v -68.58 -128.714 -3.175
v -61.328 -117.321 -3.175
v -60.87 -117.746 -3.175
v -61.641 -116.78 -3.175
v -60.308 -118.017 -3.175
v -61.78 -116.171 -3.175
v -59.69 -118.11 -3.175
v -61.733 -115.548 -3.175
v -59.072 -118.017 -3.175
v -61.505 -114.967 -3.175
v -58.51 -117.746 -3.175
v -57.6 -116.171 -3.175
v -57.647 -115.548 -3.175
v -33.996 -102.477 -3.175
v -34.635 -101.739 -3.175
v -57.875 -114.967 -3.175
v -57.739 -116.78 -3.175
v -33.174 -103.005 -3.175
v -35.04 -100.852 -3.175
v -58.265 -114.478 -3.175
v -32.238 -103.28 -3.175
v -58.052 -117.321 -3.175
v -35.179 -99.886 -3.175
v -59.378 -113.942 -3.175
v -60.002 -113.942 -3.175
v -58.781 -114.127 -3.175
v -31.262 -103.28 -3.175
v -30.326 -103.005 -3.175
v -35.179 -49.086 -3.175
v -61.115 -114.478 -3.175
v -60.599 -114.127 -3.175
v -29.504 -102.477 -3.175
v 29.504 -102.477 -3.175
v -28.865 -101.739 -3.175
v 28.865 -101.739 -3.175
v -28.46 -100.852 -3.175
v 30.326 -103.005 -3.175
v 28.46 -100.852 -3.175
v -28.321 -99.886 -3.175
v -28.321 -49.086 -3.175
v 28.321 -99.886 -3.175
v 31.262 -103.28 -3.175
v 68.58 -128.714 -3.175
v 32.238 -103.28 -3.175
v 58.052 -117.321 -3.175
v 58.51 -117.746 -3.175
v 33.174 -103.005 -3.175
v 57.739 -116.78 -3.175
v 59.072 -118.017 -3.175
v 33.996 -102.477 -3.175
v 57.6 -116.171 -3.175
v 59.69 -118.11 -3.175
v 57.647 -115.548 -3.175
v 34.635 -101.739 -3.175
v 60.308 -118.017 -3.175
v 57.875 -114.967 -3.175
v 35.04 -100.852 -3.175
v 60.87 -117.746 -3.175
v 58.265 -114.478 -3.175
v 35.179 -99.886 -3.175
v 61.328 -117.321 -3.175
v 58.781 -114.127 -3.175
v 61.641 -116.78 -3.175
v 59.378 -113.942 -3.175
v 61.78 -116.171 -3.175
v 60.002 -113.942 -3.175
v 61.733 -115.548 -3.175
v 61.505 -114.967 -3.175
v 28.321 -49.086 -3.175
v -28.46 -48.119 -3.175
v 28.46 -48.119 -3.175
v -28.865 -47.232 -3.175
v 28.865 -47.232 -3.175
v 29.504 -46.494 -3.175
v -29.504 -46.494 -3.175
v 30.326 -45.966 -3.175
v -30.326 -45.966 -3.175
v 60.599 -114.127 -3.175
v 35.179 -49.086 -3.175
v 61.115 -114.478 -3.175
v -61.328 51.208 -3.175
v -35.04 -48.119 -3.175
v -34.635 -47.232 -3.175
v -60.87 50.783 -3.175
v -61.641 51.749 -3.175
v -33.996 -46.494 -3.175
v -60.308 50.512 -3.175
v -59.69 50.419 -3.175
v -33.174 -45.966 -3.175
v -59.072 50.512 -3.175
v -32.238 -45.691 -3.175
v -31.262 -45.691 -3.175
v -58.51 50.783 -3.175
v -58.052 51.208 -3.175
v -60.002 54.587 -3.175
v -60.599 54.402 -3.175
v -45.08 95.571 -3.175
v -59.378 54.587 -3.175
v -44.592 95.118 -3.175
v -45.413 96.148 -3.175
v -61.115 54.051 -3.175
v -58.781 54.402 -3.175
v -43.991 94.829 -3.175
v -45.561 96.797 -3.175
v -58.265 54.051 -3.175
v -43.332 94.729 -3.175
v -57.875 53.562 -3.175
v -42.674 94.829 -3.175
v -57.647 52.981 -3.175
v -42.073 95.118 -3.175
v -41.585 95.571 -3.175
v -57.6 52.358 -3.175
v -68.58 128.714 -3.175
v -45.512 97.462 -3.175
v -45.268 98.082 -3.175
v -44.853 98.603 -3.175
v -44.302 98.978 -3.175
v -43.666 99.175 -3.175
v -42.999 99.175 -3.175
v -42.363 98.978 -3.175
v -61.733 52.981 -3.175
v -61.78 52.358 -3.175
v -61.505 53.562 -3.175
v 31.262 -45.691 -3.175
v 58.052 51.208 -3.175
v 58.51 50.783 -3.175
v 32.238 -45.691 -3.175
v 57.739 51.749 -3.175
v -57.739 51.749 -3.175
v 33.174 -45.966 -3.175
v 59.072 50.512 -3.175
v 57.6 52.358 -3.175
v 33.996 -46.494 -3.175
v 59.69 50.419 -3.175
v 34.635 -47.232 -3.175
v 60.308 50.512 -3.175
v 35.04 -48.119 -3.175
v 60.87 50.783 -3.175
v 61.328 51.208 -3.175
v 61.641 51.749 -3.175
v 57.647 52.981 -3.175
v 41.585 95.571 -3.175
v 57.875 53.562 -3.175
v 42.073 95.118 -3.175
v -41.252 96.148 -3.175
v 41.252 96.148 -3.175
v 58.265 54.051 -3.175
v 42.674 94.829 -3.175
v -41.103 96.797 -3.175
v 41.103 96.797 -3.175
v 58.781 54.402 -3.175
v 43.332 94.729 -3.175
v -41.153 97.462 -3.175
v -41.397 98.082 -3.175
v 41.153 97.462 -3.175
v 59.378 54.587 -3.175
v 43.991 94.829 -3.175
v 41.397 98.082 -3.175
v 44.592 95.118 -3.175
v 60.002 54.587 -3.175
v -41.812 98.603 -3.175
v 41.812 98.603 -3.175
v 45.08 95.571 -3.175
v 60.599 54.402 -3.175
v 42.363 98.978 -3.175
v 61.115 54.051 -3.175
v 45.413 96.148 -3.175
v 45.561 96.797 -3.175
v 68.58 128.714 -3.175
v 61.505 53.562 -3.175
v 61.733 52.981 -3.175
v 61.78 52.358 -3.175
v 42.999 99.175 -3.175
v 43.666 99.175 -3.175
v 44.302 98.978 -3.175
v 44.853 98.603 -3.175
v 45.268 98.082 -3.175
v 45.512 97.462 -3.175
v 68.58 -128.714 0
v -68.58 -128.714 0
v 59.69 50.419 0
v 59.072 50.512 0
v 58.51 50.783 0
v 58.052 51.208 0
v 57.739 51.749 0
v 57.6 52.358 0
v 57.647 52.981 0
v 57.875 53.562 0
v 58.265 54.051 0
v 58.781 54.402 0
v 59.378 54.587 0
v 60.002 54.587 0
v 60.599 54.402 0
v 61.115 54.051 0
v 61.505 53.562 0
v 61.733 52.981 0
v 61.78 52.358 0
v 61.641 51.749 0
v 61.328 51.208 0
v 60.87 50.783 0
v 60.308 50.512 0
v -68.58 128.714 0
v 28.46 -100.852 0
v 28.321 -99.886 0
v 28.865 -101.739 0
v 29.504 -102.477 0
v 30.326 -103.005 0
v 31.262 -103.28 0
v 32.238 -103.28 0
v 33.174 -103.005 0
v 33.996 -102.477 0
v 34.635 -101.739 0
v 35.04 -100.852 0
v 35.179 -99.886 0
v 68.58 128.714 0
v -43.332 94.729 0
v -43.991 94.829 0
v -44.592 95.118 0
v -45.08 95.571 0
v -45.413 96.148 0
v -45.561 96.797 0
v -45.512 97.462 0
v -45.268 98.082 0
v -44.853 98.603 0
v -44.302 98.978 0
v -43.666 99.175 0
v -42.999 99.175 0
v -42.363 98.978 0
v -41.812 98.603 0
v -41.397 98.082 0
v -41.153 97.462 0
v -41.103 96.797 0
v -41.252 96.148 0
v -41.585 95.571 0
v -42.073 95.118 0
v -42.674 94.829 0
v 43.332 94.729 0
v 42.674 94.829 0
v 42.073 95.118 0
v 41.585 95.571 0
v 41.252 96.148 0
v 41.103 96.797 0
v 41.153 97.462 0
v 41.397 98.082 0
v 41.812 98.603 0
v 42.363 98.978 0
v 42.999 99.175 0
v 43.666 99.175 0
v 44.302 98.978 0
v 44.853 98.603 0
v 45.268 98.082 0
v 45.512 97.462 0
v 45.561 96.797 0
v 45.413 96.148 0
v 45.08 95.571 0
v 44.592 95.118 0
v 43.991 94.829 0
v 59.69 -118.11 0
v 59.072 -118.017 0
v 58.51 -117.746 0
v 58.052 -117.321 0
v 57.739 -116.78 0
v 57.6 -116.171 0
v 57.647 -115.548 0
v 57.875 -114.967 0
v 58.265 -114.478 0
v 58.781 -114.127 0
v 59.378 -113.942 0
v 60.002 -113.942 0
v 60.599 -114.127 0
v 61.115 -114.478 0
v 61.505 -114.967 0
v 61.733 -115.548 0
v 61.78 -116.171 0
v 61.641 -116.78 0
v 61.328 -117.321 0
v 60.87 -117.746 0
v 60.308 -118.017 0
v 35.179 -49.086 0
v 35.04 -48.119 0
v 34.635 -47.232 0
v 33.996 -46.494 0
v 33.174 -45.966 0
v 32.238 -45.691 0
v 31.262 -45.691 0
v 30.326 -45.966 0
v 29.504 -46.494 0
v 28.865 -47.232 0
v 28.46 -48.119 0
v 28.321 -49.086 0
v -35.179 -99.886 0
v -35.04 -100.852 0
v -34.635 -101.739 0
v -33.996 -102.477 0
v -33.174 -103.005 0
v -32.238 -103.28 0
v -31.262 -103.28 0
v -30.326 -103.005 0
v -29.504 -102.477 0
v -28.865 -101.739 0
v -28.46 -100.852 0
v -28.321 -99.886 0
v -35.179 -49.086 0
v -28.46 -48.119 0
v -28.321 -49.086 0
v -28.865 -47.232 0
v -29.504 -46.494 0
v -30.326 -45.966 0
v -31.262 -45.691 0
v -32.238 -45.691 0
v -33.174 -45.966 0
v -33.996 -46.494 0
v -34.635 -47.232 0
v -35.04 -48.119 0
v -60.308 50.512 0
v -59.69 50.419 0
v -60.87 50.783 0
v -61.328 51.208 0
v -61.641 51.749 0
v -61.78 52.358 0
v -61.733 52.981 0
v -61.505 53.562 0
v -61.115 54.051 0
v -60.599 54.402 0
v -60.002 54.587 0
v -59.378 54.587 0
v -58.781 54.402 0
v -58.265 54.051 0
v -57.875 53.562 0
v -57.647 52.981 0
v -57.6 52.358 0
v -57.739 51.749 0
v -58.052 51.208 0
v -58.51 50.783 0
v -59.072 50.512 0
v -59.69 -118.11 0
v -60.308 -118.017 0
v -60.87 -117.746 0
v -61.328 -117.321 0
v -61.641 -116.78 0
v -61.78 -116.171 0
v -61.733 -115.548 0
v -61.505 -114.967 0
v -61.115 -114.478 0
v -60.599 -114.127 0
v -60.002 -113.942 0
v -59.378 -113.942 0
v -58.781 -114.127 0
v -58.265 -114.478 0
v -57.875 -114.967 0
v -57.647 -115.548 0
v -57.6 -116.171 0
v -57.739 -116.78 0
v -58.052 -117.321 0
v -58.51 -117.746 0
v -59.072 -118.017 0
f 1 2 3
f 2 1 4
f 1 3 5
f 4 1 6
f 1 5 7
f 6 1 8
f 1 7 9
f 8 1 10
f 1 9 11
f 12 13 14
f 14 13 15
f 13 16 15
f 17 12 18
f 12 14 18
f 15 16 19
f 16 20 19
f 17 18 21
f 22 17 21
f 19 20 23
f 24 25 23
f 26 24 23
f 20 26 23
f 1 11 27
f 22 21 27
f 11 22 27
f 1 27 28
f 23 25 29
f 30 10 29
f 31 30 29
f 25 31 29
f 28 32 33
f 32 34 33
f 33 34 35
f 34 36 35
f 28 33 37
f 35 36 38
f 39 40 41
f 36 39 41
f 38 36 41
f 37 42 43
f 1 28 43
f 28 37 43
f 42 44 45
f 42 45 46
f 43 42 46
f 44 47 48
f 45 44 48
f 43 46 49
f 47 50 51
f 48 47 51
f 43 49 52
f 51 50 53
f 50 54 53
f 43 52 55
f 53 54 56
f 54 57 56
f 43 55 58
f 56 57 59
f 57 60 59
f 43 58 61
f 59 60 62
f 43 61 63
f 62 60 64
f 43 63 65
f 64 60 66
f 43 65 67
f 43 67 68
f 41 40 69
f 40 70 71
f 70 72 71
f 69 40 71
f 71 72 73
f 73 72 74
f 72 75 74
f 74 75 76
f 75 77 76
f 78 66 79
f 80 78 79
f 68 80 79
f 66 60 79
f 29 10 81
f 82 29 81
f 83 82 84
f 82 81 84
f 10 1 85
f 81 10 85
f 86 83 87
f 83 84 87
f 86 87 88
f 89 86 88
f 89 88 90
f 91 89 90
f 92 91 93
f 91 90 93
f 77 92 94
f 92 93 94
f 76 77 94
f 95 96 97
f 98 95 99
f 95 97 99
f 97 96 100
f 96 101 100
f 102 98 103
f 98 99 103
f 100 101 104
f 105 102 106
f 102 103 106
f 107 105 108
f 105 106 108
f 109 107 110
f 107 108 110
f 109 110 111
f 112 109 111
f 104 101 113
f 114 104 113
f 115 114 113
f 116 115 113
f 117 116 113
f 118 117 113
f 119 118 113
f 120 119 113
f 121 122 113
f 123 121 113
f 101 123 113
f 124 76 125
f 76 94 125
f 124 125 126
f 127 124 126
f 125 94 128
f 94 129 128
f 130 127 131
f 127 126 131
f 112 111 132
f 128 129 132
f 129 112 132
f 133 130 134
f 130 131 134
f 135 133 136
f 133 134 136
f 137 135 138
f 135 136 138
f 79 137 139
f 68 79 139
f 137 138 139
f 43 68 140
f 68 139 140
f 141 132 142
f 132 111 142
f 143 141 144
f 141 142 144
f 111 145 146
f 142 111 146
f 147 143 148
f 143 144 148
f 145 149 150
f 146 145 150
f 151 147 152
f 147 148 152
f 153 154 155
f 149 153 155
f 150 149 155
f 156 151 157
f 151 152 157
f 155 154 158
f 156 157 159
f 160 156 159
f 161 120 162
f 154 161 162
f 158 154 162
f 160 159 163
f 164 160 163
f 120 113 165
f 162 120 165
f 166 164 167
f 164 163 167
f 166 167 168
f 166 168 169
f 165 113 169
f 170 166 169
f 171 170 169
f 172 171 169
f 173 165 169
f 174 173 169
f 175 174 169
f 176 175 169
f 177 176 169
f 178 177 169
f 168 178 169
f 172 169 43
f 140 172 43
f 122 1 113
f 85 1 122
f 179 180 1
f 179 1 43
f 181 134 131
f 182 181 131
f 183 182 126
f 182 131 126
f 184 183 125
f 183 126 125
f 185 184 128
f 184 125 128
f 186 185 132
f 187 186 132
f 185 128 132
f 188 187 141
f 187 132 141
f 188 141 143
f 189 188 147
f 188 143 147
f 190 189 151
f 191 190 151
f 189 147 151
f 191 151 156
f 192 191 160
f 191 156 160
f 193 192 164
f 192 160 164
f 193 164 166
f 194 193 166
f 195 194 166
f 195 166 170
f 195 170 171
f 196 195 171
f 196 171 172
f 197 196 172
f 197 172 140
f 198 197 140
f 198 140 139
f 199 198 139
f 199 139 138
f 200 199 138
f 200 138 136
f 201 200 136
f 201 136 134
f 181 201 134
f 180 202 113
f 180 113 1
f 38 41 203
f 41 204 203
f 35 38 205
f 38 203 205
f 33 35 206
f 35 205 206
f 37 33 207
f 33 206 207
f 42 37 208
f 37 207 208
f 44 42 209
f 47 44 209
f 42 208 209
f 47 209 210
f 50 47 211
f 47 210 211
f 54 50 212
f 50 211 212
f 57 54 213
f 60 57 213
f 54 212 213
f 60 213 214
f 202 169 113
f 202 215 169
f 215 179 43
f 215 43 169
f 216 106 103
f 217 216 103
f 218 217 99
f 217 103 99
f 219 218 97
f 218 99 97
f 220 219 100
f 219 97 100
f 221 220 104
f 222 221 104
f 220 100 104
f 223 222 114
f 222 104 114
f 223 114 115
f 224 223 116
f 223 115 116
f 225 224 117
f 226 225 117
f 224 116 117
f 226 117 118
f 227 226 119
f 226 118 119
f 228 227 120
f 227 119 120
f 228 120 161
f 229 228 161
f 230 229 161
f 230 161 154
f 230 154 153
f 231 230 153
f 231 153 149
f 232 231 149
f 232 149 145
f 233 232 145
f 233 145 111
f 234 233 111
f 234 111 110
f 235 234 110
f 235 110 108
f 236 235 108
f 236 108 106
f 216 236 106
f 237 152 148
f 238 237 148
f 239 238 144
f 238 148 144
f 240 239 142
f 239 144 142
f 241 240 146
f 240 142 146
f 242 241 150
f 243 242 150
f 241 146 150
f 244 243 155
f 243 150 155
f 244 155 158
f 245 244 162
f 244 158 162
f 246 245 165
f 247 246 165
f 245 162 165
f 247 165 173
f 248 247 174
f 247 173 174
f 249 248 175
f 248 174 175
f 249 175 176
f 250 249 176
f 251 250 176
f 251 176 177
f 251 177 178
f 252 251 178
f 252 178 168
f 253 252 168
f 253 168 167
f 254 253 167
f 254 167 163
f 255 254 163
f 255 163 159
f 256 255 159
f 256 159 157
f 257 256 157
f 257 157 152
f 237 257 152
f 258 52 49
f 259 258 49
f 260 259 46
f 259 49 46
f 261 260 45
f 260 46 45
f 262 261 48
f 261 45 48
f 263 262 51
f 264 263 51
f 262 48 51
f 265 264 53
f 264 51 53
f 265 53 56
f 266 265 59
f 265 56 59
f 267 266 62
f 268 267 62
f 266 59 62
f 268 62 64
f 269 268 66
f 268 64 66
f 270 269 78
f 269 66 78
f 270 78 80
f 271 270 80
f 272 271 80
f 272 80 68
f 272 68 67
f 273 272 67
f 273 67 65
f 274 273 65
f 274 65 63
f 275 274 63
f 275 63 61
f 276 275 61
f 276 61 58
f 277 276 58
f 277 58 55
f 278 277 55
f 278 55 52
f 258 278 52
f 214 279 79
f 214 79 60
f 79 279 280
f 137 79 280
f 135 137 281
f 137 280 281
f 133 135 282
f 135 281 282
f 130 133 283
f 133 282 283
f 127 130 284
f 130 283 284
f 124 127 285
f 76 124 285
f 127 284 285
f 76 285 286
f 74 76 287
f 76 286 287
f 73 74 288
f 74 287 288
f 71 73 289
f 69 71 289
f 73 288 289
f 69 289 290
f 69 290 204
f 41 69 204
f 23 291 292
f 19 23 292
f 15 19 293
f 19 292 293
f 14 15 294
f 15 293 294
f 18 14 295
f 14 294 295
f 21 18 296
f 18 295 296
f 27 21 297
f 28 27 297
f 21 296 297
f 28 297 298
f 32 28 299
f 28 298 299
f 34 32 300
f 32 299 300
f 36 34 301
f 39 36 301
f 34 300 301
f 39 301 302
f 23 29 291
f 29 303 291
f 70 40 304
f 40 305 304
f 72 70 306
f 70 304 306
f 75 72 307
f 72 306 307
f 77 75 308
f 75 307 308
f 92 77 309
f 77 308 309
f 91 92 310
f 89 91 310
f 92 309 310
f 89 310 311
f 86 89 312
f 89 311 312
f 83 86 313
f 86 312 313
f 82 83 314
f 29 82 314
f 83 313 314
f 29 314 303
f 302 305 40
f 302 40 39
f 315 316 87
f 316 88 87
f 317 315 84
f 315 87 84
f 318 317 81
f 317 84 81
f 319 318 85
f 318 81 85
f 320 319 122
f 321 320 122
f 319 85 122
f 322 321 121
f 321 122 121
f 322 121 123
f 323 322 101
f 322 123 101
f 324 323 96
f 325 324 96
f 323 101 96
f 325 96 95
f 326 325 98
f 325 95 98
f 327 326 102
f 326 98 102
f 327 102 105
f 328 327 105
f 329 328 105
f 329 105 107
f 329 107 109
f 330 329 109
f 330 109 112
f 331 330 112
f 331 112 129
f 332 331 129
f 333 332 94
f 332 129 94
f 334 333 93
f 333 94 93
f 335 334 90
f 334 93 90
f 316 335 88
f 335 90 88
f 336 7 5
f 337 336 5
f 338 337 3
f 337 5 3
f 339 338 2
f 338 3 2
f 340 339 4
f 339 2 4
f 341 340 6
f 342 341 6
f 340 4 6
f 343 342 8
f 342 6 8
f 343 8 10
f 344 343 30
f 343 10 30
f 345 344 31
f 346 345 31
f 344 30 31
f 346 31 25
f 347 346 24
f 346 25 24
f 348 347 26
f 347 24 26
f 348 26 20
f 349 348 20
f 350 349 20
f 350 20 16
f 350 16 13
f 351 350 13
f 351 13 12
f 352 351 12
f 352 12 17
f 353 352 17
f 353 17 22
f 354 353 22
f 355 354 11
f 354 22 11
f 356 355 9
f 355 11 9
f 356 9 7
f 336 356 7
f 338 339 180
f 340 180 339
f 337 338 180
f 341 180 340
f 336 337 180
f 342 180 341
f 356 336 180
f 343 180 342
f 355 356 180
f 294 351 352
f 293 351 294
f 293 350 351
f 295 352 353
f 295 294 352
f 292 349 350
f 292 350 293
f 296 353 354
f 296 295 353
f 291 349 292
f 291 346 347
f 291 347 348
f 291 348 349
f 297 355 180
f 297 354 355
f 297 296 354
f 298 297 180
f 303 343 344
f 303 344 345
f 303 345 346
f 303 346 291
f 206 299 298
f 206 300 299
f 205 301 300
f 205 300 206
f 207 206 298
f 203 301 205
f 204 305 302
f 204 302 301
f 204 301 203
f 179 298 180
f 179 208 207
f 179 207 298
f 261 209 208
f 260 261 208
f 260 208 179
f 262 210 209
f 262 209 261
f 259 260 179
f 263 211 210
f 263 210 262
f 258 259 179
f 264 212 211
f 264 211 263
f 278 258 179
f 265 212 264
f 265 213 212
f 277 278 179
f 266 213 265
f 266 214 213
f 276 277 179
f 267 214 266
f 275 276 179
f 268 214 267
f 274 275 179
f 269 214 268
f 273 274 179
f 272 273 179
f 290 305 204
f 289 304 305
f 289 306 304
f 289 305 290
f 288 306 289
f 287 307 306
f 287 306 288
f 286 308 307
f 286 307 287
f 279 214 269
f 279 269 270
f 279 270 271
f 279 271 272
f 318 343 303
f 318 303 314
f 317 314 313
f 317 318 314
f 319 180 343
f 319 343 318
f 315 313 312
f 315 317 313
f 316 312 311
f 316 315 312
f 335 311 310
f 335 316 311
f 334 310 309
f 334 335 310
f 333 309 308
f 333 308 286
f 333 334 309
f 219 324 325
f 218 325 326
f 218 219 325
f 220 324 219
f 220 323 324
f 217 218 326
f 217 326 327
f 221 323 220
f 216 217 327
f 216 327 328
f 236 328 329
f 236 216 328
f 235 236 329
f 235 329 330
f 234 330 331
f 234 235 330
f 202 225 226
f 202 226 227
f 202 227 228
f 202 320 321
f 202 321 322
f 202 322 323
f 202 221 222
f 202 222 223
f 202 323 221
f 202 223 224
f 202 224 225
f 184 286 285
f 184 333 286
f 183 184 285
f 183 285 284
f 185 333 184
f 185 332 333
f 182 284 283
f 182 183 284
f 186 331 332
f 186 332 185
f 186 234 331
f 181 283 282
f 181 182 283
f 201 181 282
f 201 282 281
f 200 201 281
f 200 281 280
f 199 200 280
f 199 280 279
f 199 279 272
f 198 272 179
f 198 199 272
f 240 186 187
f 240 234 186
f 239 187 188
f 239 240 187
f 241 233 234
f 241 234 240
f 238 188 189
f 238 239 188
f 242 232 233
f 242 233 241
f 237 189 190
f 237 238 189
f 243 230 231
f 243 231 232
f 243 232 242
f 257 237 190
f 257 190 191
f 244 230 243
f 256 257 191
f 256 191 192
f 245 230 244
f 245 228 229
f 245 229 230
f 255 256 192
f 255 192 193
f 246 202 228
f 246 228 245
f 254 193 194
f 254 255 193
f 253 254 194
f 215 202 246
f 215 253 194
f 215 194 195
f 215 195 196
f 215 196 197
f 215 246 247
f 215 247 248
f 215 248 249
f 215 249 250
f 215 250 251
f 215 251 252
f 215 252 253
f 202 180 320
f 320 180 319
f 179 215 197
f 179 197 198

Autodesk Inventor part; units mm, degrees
ref_plane "YZ Plane" through (0, 0, 0) normal (1, 0, 0) x (0, 1, 0)
ref_plane "XZ Plane" through (0, 0, 0) normal (0, 1, 0) x (-1, 0, 0)
ref_plane "XY Plane" through (0, 0, 0) normal (0, 0, 1) x (1, 0, 0)
sketch "Sketch1" plane through (0, 0, 0) normal (0, 0, 1) x (1, 0, 0)
  line L0 (-68.58, -128.7145) -> (68.58, -128.7145)
  line L1 (68.58, -128.7145) -> (68.58, 128.7145)
  line L2 (68.58, 128.7145) -> (-68.58, 128.7145)
  line L3 (-68.58, 128.7145) -> (-68.58, -128.7145)
  line L4 (-68.58, -128.7145) -> (68.58, 128.7145) construction
  line L5 (68.58, -128.7145) -> (-68.58, 128.7145) construction
  point P0 (0, 0)
  dimension "d0" = 137.16
  dimension "d1" = 257.429
extrude "Extrusion1" add sketch "Sketch1" against normal blind 3.175
sketch "Sketch2" plane through (0, 0, 0) normal (0, 0, 1) x (1, 0, 0)
  circle A0 centre (-59.69, 52.5145) radius 2.0955
  line L0 (-68.58, 128.7145) -> (-68.58, -128.7145) projected
  line L1 (-68.58, 128.7145) -> (68.58, 128.7145) projected
  circle A1 centre (59.69, 52.5145) radius 2.0955
  line L2 (68.58, -128.7145) -> (68.58, 128.7145) projected
  circle A2 centre (-59.69, -116.0145) radius 2.0955
  circle A3 centre (59.69, -116.0145) radius 2.0955
  line L3 (-68.58, -128.7145) -> (68.58, -128.7145) projected
  point P0 (0, 0)
  dimension "d4" = 8.89
  dimension "d5" = 76.2
  dimension "d6" = 76.2
  dimension "d7" = 8.89
  dimension "d8" = 4.191
  dimension "d9" = 12.7
  dimension "d10" = 8.89
  dimension "d11" = 8.89
  dimension "d12" = 12.7
  dimension "d13" = 4.191
  dimension "d21" = 4.191
  dimension "d22" = 4.191
hole "Hole1" at (-59.69, 52.5145, 0) at (59.69, 52.5145, 0) at (-59.69, -116.0145, 0) at (59.69, -116.0145, 0) direction (0, 0, -1) diameter 4.191 end through all
sketch "Sketch4" plane through (0, 0, 0) normal (0, 0, 1) x (1, 0, 0)
  line L0 (-35.179, -49.0855) -> (-35.179, -99.8855)
  line L1 (-28.321, -49.0855) -> (-28.321, -99.8855)
  line L2 (28.321, -49.0855) -> (28.321, -99.8855)
  line L3 (35.179, -49.0855) -> (35.179, -99.8855)
  line L4 (-68.58, 128.7145) -> (-68.58, -128.7145) projected
  line L5 (68.58, -128.7145) -> (68.58, 128.7145) projected
  line L6 (-68.58, -128.7145) -> (68.58, -128.7145) projected
  arc A0 (-28.321, -49.0855) -> (-35.179, -49.0855) centre (-31.75, -49.0855) ccw
  arc A1 (-35.179, -99.8855) -> (-28.321, -99.8855) centre (-31.75, -99.8855) ccw
  arc A2 (35.179, -49.0855) -> (28.321, -49.0855) centre (31.75, -49.0855) ccw
  arc A3 (28.321, -99.8855) -> (35.179, -99.8855) centre (31.75, -99.8855) ccw
  point P0 (0, 0)
  dimension "d23" = 6.858
  dimension "d24" = 6.858
  dimension "d25" = 33.401
  dimension "d26" = 50.8
  dimension "d27" = 33.401
  dimension "d28" = 28.829
  dimension "d29" = 28.829
  dimension "d30" = 28.829
  dimension "d31" = 28.829
  dimension "d32" = 50.8
  dimension "d33" = 50.8
  dimension "d34" = 50.8
extrude "Extrusion2" cut sketch "Sketch4" against normal blind 3.175
sketch "Sketch5" plane through (0, 0, 0) normal (0, 0, 1) x (1, 0, 0)
  line L0 (-68.58, 128.7145) -> (68.58, 128.7145) projected
  line L1 (68.58, 128.7145) -> (68.58, -128.7145) projected
  point P0 (0, 0)
  point P1 (-43.3324, 96.9645)
  point P2 (43.3324, 96.9645)
  dimension "d37" = 31.75
  dimension "d38" = 86.6648
  dimension "d39" = 31.75
  dimension "d40" = 25.2476
hole "Hole2" at (-43.3324, 96.9645, 0) at (43.3324, 96.9645, 0) direction (0, 0, -1) diameter 4.4704 end through all
sketch "smartsensorPowered" plane through (0, 0, 0) normal (0, 0, 1) x (1, 0, 0)
  line L0 (-68.58, 128.7145) -> (-68.58, -128.7145) projected
  line L1 (68.58, 128.7145) -> (-68.58, 128.7145) projected
  line L2 (68.58, -128.7145) -> (68.58, 128.7145) projected
  line L3 (-44.45, 33.4645) -> (-16.51, 33.4645)
  line L4 (-16.51, 33.4645) -> (-16.51, -26.2255)
  line L5 (-16.51, -26.2255) -> (-44.45, -26.2255)
  line L6 (-44.45, -26.2255) -> (-44.45, 33.4645)
  circle A0 centre (-41.275, 30.2895) radius 1.651
  circle A1 centre (-40.64, -22.4155) radius 1.651
  circle A2 centre (-19.685, 2.9845) radius 1.651
  circle A3 centre (-19.685, 30.2895) radius 1.651
  line L7 (-3.81, 33.4645) -> (24.13, 33.4645)
  line L8 (24.13, 33.4645) -> (24.13, -26.2255)
  line L9 (24.13, -26.2255) -> (-3.81, -26.2255)
  line L10 (-3.81, -26.2255) -> (-3.81, 33.4645)
  circle A4 centre (-0.635, 30.2895) radius 1.651
  circle A5 centre (0, -22.4155) radius 1.651
  circle A6 centre (20.955, 2.9845) radius 1.651
  circle A7 centre (20.955, 30.2895) radius 1.651
  point P0 (0, 0)
  dimension "d52" = 27.94
  dimension "d53" = 59.69
  dimension "d59" = 3.175
  dimension "d60" = 3.175
  dimension "d61" = 3.302
  dimension "d62" = 3.302
  dimension "d63" = 3.175
  dimension "d64" = 3.175
  dimension "d66" = 3.81
  dimension "d67" = 3.81
  dimension "d68" = 3.302
  dimension "d69" = 30.48
  dimension "d70" = 3.175
  dimension "d71" = 3.302
  dimension "d72" = 27.94
  dimension "d73" = 59.69
  dimension "d74" = 3.175
  dimension "d75" = 3.175
  dimension "d76" = 3.302
  dimension "d77" = 3.302
  dimension "d78" = 3.175
  dimension "d79" = 3.175
  dimension "d80" = 3.81
  dimension "d81" = 3.81
  dimension "d82" = 3.302
  dimension "d83" = 30.48
  dimension "d84" = 3.175
  dimension "d85" = 3.302
  dimension "d86" = 12.7
sketch "BoardArea" plane through (0, 0, 0) normal (0, 0, 1) x (1, 0, 0)
  line L0 (-50.8, 39.8145) -> (50.8, 39.8145)
  line L1 (50.8, 39.8145) -> (50.8, -36.3855)
  line L2 (50.8, -36.3855) -> (-50.8, -36.3855)
  line L3 (-50.8, -36.3855) -> (-50.8, 39.8145)
  point P0 (0, 0)
sketch "teamflag" plane through (0, 0, 0) normal (0, 0, 1) x (1, 0, 0)
  line L0 (-3.81, -7.1755) -> (-44.45, -7.1755)
  line L1 (-44.45, -7.1755) -> (-44.45, 33.4645)
  line L2 (-44.45, 33.4645) -> (-3.81, 33.4645)
  line L3 (-3.81, 33.4645) -> (-3.81, -7.1755)
  circle A0 centre (-6.35, 30.9245) radius 1.651
  circle A1 centre (-41.91, 30.9245) radius 1.651
  circle A2 centre (-41.91, -4.6355) radius 1.651
  circle A3 centre (-6.35, -4.6355) radius 1.651
  line L4 (-50.8, -36.3855) -> (-50.8, 39.8145) projected
  circle A4 centre (-43.3324, 96.9645) radius 2.2352 projected
  circle A5 centre (43.3324, 96.9645) radius 2.2352 projected
  arc A6 (-35.179, -99.8855) -> (-28.321, -99.8855) centre (-31.75, -99.8855) ccw projected
  line L5 (-28.321, -99.8855) -> (-28.321, -49.0855) projected
  arc A7 (-28.321, -49.0855) -> (-35.179, -49.0855) centre (-31.75, -49.0855) ccw projected
  line L6 (-35.179, -49.0855) -> (-35.179, -99.8855) projected
  arc A8 (28.321, -99.8855) -> (35.179, -99.8855) centre (31.75, -99.8855) ccw projected
  line L7 (35.179, -99.8855) -> (35.179, -49.0855) projected
  arc A9 (35.179, -49.0855) -> (28.321, -49.0855) centre (31.75, -49.0855) ccw projected
  line L8 (28.321, -49.0855) -> (28.321, -99.8855) projected
  circle A10 centre (-59.69, -116.0145) radius 2.0955 projected
  circle A11 centre (-59.69, 52.5145) radius 2.0955 projected
  circle A12 centre (59.69, 52.5145) radius 2.0955 projected
  circle A13 centre (59.69, -116.0145) radius 2.0955 projected
  line L9 (68.58, 128.7145) -> (68.58, -128.7145) projected
  line L10 (68.58, -128.7145) -> (-68.58, -128.7145) projected
  line L11 (-68.58, -128.7145) -> (-68.58, 128.7145) projected
  line L12 (-68.58, 128.7145) -> (68.58, 128.7145) projected
  circle A14 centre (-43.3324, 96.9645) radius 2.2352 projected
  circle A15 centre (43.3324, 96.9645) radius 2.2352 projected
  arc A16 (-35.179, -99.8855) -> (-28.321, -99.8855) centre (-31.75, -99.8855) ccw projected
  line L13 (-28.321, -99.8855) -> (-28.321, -49.0855) projected
  arc A17 (-28.321, -49.0855) -> (-35.179, -49.0855) centre (-31.75, -49.0855) ccw projected
  line L14 (-35.179, -49.0855) -> (-35.179, -99.8855) projected
  arc A18 (28.321, -99.8855) -> (35.179, -99.8855) centre (31.75, -99.8855) ccw projected
  line L15 (35.179, -99.8855) -> (35.179, -49.0855) projected
  arc A19 (35.179, -49.0855) -> (28.321, -49.0855) centre (31.75, -49.0855) ccw projected
  line L16 (28.321, -49.0855) -> (28.321, -99.8855) projected
  circle A20 centre (-59.69, -116.0145) radius 2.0955 projected
  circle A21 centre (-59.69, 52.5145) radius 2.0955 projected
  circle A22 centre (59.69, 52.5145) radius 2.0955 projected
  circle A23 centre (59.69, -116.0145) radius 2.0955 projected
  line L17 (68.58, 128.7145) -> (68.58, -128.7145) projected
  line L18 (68.58, -128.7145) -> (-68.58, -128.7145) projected
  line L19 (-68.58, -128.7145) -> (-68.58, 128.7145) projected
  line L20 (-68.58, 128.7145) -> (68.58, 128.7145) projected
  circle A24 centre (-43.3324, 96.9645) radius 2.2352 projected
  circle A25 centre (43.3324, 96.9645) radius 2.2352 projected
  arc A26 (-35.179, -99.8855) -> (-28.321, -99.8855) centre (-31.75, -99.8855) ccw projected
  line L21 (-28.321, -99.8855) -> (-28.321, -49.0855) projected
  arc A27 (-28.321, -49.0855) -> (-35.179, -49.0855) centre (-31.75, -49.0855) ccw projected
  line L22 (-35.179, -49.0855) -> (-35.179, -99.8855) projected
  arc A28 (28.321, -99.8855) -> (35.179, -99.8855) centre (31.75, -99.8855) ccw projected
  line L23 (35.179, -99.8855) -> (35.179, -49.0855) projected
  arc A29 (35.179, -49.0855) -> (28.321, -49.0855) centre (31.75, -49.0855) ccw projected
  line L24 (28.321, -49.0855) -> (28.321, -99.8855) projected
  circle A30 centre (-59.69, -116.0145) radius 2.0955 projected
  circle A31 centre (-59.69, 52.5145) radius 2.0955 projected
  circle A32 centre (59.69, 52.5145) radius 2.0955 projected
  circle A33 centre (59.69, -116.0145) radius 2.0955 projected
  line L25 (68.58, 128.7145) -> (68.58, -128.7145) projected
  line L26 (68.58, -128.7145) -> (-68.58, -128.7145) projected
  line L27 (-68.58, -128.7145) -> (-68.58, 128.7145) projected
  line L28 (-68.58, 128.7145) -> (68.58, 128.7145) projected
  circle A34 centre (-43.3324, 96.9645) radius 2.2352 projected
  circle A35 centre (43.3324, 96.9645) radius 2.2352 projected
  arc A36 (-35.179, -99.8855) -> (-28.321, -99.8855) centre (-31.75, -99.8855) ccw projected
  line L29 (-28.321, -99.8855) -> (-28.321, -49.0855) projected
  arc A37 (-28.321, -49.0855) -> (-35.179, -49.0855) centre (-31.75, -49.0855) ccw projected
  line L30 (-35.179, -49.0855) -> (-35.179, -99.8855) projected
  arc A38 (28.321, -99.8855) -> (35.179, -99.8855) centre (31.75, -99.8855) ccw projected
  line L31 (35.179, -99.8855) -> (35.179, -49.0855) projected
  arc A39 (35.179, -49.0855) -> (28.321, -49.0855) centre (31.75, -49.0855) ccw projected
  line L32 (28.321, -49.0855) -> (28.321, -99.8855) projected
  circle A40 centre (-59.69, -116.0145) radius 2.0955 projected
  circle A41 centre (-59.69, 52.5145) radius 2.0955 projected
  circle A42 centre (59.69, 52.5145) radius 2.0955 projected
  circle A43 centre (59.69, -116.0145) radius 2.0955 projected
  line L33 (68.58, 128.7145) -> (68.58, -128.7145) projected
  line L34 (68.58, -128.7145) -> (-68.58, -128.7145) projected
  line L35 (-68.58, -128.7145) -> (-68.58, 128.7145) projected
  line L36 (-68.58, 128.7145) -> (68.58, 128.7145) projected
  circle A44 centre (-43.3324, 96.9645) radius 2.2352 projected
  circle A45 centre (43.3324, 96.9645) radius 2.2352 projected
  arc A46 (-35.179, -99.8855) -> (-28.321, -99.8855) centre (-31.75, -99.8855) ccw projected
  line L37 (-28.321, -99.8855) -> (-28.321, -49.0855) projected
  arc A47 (-28.321, -49.0855) -> (-35.179, -49.0855) centre (-31.75, -49.0855) ccw projected
  line L38 (-35.179, -49.0855) -> (-35.179, -99.8855) projected
  arc A48 (28.321, -99.8855) -> (35.179, -99.8855) centre (31.75, -99.8855) ccw projected
  line L39 (35.179, -99.8855) -> (35.179, -49.0855) projected
  arc A49 (35.179, -49.0855) -> (28.321, -49.0855) centre (31.75, -49.0855) ccw projected
  line L40 (28.321, -49.0855) -> (28.321, -99.8855) projected
  circle A50 centre (-59.69, -116.0145) radius 2.0955 projected
  circle A51 centre (-59.69, 52.5145) radius 2.0955 projected
  circle A52 centre (59.69, 52.5145) radius 2.0955 projected
  circle A53 centre (59.69, -116.0145) radius 2.0955 projected
  line L41 (68.58, 128.7145) -> (68.58, -128.7145) projected
  line L42 (68.58, -128.7145) -> (-68.58, -128.7145) projected
  line L43 (-68.58, -128.7145) -> (-68.58, 128.7145) projected
  line L44 (-68.58, 128.7145) -> (68.58, 128.7145) projected
  line L45 (-50.8, 39.8145) -> (50.8, 39.8145) projected
  line L46 (43.18, -7.1755) -> (2.54, -7.1755)
  line L47 (2.54, -7.1755) -> (2.54, 33.4645)
  line L48 (2.54, 33.4645) -> (43.18, 33.4645)
  line L49 (43.18, 33.4645) -> (43.18, -7.1755)
  circle A54 centre (40.64, 30.9245) radius 1.651
  circle A55 centre (5.08, 30.9245) radius 1.651
  circle A56 centre (5.08, -4.6355) radius 1.651
  circle A57 centre (40.64, -4.6355) radius 1.651
  dimension "d100" = 3.302
  dimension "d101" = 40.64
  dimension "d102" = 40.64
  dimension "d103" = 2.54
  dimension "d104" = 2.54
  dimension "d105" = 2.54
  dimension "d106" = 38.1
  dimension "d107" = 38.1
  dimension "d108" = 2.54
  dimension "d109" = 38.1
  dimension "d110" = 38.1
  dimension "d113" = 3.302
  dimension "d114" = 40.64
  dimension "d115" = 40.64
  dimension "d116" = 2.54
  dimension "d117" = 2.54
  dimension "d118" = 2.54
  dimension "d119" = 38.1
  dimension "d120" = 38.1
  dimension "d121" = 2.54
  dimension "d122" = 38.1
  dimension "d123" = 38.1
  dimension "d124" = 6.35
sketch "cape" plane through (0, 0, 0) normal (0, 0, 1) x (1, 0, 0)
  line L0 (-44.45, -21.1355) -> (27.61, -21.1355)
  line L1 (27.61, -21.1355) -> (27.61, 33.4645)
  line L2 (27.61, 33.4645) -> (-44.45, 33.4645)
  line L3 (-44.45, 33.4645) -> (-44.45, -21.1355)
  circle A0 centre (-41.275, -17.9605) radius 1.5875
  circle A1 centre (24.765, -14.7855) radius 1.5875
  circle A2 centre (24.765, 27.1245) radius 1.5875
  circle A3 centre (-41.275, 30.2995) radius 1.5875
  line L4 (-50.8, 39.8145) -> (50.8, 39.8145) projected
  line L5 (-50.8, -36.3855) -> (-50.8, 39.8145) projected
  point P0 (0, 0)
  dimension "d125" = 3.175
  dimension "d126" = 72.06
  dimension "d127" = 54.6
  dimension "d130" = 2.845
  dimension "d131" = 6.34
  dimension "d132" = 2.845
  dimension "d133" = 48.25
  dimension "d134" = 68.885
  dimension "d135" = 3.165
  dimension "d136" = 68.885
  dimension "d137" = 51.425
